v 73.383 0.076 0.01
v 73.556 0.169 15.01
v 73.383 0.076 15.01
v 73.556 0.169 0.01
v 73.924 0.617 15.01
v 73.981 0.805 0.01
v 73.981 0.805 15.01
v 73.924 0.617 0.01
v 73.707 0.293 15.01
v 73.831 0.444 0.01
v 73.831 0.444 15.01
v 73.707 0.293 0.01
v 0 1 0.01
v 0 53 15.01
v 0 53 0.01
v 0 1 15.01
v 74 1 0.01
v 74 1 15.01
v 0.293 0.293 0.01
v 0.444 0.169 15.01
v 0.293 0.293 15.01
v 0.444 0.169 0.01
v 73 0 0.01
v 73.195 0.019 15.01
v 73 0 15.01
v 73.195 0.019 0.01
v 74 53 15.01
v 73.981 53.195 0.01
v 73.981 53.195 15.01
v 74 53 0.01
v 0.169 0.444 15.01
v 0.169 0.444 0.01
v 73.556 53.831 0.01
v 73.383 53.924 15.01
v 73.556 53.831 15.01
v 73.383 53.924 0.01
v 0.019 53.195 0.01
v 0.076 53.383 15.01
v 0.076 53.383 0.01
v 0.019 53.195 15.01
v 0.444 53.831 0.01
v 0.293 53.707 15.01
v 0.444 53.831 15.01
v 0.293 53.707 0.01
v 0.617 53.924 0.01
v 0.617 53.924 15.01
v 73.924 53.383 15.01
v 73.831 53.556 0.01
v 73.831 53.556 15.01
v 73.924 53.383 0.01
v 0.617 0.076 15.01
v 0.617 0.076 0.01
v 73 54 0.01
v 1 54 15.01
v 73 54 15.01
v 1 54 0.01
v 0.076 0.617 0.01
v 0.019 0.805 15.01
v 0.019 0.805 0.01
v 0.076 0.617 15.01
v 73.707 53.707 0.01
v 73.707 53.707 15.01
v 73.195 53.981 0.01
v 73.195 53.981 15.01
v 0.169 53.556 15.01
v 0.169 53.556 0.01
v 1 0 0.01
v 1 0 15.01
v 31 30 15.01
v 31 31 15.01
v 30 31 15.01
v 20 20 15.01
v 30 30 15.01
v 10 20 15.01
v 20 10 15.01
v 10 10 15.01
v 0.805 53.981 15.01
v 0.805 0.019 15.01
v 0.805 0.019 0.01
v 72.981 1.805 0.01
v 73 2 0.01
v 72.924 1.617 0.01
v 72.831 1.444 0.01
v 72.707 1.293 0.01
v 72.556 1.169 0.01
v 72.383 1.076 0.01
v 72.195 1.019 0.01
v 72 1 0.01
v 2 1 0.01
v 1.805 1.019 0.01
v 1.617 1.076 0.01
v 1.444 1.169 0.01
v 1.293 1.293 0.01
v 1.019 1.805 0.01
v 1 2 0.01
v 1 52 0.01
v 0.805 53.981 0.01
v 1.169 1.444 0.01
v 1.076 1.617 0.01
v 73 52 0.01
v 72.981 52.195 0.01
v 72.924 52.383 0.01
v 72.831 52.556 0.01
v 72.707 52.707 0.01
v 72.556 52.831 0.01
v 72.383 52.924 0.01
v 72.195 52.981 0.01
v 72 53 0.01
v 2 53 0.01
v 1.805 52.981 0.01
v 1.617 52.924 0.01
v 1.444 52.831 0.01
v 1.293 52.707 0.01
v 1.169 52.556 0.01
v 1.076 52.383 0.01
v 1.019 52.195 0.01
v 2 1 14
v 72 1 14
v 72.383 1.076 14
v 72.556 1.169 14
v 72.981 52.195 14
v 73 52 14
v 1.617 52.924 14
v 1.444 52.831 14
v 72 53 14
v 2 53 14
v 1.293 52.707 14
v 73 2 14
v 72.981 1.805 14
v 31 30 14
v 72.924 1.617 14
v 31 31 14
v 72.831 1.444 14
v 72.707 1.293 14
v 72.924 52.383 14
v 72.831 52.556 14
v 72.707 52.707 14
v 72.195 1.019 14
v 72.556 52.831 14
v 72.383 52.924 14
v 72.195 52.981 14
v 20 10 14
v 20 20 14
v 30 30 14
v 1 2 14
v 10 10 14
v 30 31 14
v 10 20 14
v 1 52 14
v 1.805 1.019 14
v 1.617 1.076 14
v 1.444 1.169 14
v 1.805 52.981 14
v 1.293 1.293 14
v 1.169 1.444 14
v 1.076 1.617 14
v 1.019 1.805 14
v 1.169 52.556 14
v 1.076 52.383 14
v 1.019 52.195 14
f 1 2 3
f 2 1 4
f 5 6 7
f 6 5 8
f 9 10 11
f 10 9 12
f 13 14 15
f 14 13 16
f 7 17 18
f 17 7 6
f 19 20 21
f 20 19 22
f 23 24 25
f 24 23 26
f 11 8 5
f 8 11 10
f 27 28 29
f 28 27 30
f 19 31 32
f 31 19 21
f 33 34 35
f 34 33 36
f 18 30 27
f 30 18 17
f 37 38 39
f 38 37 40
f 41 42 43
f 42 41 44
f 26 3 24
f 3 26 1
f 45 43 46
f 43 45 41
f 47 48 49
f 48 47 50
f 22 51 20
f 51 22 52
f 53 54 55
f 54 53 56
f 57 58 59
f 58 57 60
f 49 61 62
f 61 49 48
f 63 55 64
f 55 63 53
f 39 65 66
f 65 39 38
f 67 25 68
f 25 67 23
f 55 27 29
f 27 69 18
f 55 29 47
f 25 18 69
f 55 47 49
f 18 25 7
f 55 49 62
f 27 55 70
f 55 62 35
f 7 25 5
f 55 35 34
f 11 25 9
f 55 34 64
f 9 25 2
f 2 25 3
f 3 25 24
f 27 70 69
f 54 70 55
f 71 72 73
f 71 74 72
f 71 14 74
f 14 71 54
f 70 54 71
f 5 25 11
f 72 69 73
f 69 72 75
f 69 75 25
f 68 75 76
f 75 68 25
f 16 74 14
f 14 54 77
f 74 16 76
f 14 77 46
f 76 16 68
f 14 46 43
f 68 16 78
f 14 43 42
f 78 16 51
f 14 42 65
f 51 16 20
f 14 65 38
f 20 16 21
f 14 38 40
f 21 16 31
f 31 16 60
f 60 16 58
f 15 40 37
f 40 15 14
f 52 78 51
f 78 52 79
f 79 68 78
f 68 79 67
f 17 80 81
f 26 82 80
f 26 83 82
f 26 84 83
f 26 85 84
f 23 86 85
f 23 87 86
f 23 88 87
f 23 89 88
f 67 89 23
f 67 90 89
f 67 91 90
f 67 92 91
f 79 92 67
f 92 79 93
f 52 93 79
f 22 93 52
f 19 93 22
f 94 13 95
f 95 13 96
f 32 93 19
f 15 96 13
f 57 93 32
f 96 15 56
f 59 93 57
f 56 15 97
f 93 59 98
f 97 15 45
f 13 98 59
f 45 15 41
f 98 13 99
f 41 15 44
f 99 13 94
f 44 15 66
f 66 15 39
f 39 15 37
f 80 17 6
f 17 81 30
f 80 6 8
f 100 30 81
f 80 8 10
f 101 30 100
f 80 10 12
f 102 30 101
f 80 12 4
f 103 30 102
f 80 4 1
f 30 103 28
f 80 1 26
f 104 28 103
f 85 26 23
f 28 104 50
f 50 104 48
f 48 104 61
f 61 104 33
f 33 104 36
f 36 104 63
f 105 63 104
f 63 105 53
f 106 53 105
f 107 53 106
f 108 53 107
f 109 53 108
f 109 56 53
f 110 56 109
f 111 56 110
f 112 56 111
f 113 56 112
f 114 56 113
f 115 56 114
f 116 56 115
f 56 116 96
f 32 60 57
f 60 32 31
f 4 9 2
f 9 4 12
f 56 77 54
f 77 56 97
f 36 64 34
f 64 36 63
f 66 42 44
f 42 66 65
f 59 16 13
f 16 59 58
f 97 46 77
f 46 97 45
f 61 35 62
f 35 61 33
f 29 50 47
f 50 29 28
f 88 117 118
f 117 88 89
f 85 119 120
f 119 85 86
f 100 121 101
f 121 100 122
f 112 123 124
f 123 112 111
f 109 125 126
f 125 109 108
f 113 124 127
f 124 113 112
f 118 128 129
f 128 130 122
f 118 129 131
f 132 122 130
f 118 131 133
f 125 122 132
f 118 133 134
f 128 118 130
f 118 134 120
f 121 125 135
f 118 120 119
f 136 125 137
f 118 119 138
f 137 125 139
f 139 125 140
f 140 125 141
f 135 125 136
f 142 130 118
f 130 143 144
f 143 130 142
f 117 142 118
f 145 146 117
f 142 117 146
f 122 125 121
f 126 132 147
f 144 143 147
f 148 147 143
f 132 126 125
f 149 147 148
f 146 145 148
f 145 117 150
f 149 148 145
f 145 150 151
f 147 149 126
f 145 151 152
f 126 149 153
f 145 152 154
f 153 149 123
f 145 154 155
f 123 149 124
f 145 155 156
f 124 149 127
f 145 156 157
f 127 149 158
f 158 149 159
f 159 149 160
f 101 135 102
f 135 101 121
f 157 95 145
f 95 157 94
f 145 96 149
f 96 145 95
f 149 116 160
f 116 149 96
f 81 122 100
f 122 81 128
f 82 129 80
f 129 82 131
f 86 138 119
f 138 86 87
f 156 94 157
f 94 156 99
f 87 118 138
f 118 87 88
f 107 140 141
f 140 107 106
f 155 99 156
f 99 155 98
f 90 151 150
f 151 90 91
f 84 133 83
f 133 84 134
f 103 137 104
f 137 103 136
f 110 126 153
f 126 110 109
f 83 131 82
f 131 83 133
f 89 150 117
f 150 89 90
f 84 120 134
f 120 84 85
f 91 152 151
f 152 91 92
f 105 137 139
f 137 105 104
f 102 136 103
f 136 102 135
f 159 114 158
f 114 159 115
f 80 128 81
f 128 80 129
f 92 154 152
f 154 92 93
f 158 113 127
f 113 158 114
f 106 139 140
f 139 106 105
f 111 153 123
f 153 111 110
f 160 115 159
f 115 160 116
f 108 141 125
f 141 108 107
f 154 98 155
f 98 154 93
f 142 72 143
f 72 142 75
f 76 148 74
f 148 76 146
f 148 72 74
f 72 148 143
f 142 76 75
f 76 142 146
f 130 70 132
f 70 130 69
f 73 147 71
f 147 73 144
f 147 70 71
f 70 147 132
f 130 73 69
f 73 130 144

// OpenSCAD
// file: MODULES/roundedcube.scad
// Original source: https://danielupshaw.com/openscad-rounded-corners/

// use this for working
$fs = 0.2;
// use the for rendering
// $fs = 0.02;

module roundedcube(size = [1, 1, 1], center = false, radius = 0.5, apply_to = "all") {
	// If single value, convert to [x, y, z] vector
	size = (size[0] == undef) ? [size, size, size] : size;

	translate_min = radius;
	translate_xmax = size[0] - radius;
	translate_ymax = size[1] - radius;
	translate_zmax = size[2] - radius;

	diameter = radius * 2;

	module build_point(type = "sphere", rotate = [0, 0, 0]) {
		if (type == "sphere") {
			sphere(r = radius);
		} else if (type == "cylinder") {
			rotate(a = rotate)
			cylinder(h = diameter, r = radius, center = true);
		}
	}

	obj_translate = (center == false) ?
		[0, 0, 0] : [
			-(size[0] / 2),
			-(size[1] / 2),
			-(size[2] / 2)
		];

	translate(v = obj_translate) {
		hull() {
			for (translate_x = [translate_min, translate_xmax]) {
				x_at = (translate_x == translate_min) ? "min" : "max";
				for (translate_y = [translate_min, translate_ymax]) {
					y_at = (translate_y == translate_min) ? "min" : "max";
					for (translate_z = [translate_min, translate_zmax]) {
						z_at = (translate_z == translate_min) ? "min" : "max";

						translate(v = [translate_x, translate_y, translate_z])
						if (
							(apply_to == "all") ||
							(apply_to == "xmin" && x_at == "min") || (apply_to == "xmax" && x_at == "max") ||
							(apply_to == "ymin" && y_at == "min") || (apply_to == "ymax" && y_at == "max") ||
							(apply_to == "zmin" && z_at == "min") || (apply_to == "zmax" && z_at == "max")
						) {
							build_point("sphere");
						} else {
							rotate = 
								(apply_to == "xmin" || apply_to == "xmax" || apply_to == "x") ? [0, 90, 0] : (
								(apply_to == "ymin" || apply_to == "ymax" || apply_to == "y") ? [90, 90, 0] :
								[0, 0, 0]
							);
							build_point("cylinder", rotate);
						}
					}
				}
			}
		}
	}
}
// main file
// Electronics Enclosure OpenSCAD Template
//  By Carsten Thue-Bludworth

use <MODULES/roundedcube.scad>;

// Global configuration
$fa = 1;
$fs = 0.4;
// Amount of offset to help OpenSCAD with unions and diffs
_DELTA = 0.01;
// The amount of space between the PCB edge and the inner wall of enclosure
MARGIN = 1;
// The thickness of the enclosure wall
WALL_THICKNESS = 1;
// Dimensions of the PCB
PCB_X = 70;
ENC_X_INNER = PCB_X + 2*MARGIN;
ENC_X_OUTER = PCB_X + 2*(MARGIN + WALL_THICKNESS);
PCB_Y = 50;
ENC_Y_INNER = PCB_Y + 2*MARGIN;
ENC_Y_OUTER = PCB_Y + 2*(MARGIN + WALL_THICKNESS);
PCB_Z = 15;
PCB_RADIUS = 1;

// Enclosure body
module body() {
    difference() {
        translate([0, 0, _DELTA])
            roundedcube([ENC_X_OUTER, ENC_Y_OUTER, PCB_Z], radius=PCB_RADIUS, apply_to="z");
        translate([WALL_THICKNESS, WALL_THICKNESS, 0])
            roundedcube([ENC_X_INNER, ENC_Y_INNER, PCB_Z-WALL_THICKNESS], radius=PCB_RADIUS, apply_to="z");
    }
}

// Top cutouts
co_x  = 10;
co_offset_x = 10;
co_y  = 10;
co_offset_y = 10;
co_z  =  1;

module top_cutout(x=1, y=1, x_off=0, y_off=0) {
    translate([x_off, y_off, PCB_Z-WALL_THICKNESS-_DELTA])
        cube([x, y, WALL_THICKNESS+(3*_DELTA)]);
}

// Main model
difference() {
    body();
    top_cutout(co_x, co_y, co_offset_x, co_offset_y);
    top_cutout(x_off = 30, y_off = 30);
}
